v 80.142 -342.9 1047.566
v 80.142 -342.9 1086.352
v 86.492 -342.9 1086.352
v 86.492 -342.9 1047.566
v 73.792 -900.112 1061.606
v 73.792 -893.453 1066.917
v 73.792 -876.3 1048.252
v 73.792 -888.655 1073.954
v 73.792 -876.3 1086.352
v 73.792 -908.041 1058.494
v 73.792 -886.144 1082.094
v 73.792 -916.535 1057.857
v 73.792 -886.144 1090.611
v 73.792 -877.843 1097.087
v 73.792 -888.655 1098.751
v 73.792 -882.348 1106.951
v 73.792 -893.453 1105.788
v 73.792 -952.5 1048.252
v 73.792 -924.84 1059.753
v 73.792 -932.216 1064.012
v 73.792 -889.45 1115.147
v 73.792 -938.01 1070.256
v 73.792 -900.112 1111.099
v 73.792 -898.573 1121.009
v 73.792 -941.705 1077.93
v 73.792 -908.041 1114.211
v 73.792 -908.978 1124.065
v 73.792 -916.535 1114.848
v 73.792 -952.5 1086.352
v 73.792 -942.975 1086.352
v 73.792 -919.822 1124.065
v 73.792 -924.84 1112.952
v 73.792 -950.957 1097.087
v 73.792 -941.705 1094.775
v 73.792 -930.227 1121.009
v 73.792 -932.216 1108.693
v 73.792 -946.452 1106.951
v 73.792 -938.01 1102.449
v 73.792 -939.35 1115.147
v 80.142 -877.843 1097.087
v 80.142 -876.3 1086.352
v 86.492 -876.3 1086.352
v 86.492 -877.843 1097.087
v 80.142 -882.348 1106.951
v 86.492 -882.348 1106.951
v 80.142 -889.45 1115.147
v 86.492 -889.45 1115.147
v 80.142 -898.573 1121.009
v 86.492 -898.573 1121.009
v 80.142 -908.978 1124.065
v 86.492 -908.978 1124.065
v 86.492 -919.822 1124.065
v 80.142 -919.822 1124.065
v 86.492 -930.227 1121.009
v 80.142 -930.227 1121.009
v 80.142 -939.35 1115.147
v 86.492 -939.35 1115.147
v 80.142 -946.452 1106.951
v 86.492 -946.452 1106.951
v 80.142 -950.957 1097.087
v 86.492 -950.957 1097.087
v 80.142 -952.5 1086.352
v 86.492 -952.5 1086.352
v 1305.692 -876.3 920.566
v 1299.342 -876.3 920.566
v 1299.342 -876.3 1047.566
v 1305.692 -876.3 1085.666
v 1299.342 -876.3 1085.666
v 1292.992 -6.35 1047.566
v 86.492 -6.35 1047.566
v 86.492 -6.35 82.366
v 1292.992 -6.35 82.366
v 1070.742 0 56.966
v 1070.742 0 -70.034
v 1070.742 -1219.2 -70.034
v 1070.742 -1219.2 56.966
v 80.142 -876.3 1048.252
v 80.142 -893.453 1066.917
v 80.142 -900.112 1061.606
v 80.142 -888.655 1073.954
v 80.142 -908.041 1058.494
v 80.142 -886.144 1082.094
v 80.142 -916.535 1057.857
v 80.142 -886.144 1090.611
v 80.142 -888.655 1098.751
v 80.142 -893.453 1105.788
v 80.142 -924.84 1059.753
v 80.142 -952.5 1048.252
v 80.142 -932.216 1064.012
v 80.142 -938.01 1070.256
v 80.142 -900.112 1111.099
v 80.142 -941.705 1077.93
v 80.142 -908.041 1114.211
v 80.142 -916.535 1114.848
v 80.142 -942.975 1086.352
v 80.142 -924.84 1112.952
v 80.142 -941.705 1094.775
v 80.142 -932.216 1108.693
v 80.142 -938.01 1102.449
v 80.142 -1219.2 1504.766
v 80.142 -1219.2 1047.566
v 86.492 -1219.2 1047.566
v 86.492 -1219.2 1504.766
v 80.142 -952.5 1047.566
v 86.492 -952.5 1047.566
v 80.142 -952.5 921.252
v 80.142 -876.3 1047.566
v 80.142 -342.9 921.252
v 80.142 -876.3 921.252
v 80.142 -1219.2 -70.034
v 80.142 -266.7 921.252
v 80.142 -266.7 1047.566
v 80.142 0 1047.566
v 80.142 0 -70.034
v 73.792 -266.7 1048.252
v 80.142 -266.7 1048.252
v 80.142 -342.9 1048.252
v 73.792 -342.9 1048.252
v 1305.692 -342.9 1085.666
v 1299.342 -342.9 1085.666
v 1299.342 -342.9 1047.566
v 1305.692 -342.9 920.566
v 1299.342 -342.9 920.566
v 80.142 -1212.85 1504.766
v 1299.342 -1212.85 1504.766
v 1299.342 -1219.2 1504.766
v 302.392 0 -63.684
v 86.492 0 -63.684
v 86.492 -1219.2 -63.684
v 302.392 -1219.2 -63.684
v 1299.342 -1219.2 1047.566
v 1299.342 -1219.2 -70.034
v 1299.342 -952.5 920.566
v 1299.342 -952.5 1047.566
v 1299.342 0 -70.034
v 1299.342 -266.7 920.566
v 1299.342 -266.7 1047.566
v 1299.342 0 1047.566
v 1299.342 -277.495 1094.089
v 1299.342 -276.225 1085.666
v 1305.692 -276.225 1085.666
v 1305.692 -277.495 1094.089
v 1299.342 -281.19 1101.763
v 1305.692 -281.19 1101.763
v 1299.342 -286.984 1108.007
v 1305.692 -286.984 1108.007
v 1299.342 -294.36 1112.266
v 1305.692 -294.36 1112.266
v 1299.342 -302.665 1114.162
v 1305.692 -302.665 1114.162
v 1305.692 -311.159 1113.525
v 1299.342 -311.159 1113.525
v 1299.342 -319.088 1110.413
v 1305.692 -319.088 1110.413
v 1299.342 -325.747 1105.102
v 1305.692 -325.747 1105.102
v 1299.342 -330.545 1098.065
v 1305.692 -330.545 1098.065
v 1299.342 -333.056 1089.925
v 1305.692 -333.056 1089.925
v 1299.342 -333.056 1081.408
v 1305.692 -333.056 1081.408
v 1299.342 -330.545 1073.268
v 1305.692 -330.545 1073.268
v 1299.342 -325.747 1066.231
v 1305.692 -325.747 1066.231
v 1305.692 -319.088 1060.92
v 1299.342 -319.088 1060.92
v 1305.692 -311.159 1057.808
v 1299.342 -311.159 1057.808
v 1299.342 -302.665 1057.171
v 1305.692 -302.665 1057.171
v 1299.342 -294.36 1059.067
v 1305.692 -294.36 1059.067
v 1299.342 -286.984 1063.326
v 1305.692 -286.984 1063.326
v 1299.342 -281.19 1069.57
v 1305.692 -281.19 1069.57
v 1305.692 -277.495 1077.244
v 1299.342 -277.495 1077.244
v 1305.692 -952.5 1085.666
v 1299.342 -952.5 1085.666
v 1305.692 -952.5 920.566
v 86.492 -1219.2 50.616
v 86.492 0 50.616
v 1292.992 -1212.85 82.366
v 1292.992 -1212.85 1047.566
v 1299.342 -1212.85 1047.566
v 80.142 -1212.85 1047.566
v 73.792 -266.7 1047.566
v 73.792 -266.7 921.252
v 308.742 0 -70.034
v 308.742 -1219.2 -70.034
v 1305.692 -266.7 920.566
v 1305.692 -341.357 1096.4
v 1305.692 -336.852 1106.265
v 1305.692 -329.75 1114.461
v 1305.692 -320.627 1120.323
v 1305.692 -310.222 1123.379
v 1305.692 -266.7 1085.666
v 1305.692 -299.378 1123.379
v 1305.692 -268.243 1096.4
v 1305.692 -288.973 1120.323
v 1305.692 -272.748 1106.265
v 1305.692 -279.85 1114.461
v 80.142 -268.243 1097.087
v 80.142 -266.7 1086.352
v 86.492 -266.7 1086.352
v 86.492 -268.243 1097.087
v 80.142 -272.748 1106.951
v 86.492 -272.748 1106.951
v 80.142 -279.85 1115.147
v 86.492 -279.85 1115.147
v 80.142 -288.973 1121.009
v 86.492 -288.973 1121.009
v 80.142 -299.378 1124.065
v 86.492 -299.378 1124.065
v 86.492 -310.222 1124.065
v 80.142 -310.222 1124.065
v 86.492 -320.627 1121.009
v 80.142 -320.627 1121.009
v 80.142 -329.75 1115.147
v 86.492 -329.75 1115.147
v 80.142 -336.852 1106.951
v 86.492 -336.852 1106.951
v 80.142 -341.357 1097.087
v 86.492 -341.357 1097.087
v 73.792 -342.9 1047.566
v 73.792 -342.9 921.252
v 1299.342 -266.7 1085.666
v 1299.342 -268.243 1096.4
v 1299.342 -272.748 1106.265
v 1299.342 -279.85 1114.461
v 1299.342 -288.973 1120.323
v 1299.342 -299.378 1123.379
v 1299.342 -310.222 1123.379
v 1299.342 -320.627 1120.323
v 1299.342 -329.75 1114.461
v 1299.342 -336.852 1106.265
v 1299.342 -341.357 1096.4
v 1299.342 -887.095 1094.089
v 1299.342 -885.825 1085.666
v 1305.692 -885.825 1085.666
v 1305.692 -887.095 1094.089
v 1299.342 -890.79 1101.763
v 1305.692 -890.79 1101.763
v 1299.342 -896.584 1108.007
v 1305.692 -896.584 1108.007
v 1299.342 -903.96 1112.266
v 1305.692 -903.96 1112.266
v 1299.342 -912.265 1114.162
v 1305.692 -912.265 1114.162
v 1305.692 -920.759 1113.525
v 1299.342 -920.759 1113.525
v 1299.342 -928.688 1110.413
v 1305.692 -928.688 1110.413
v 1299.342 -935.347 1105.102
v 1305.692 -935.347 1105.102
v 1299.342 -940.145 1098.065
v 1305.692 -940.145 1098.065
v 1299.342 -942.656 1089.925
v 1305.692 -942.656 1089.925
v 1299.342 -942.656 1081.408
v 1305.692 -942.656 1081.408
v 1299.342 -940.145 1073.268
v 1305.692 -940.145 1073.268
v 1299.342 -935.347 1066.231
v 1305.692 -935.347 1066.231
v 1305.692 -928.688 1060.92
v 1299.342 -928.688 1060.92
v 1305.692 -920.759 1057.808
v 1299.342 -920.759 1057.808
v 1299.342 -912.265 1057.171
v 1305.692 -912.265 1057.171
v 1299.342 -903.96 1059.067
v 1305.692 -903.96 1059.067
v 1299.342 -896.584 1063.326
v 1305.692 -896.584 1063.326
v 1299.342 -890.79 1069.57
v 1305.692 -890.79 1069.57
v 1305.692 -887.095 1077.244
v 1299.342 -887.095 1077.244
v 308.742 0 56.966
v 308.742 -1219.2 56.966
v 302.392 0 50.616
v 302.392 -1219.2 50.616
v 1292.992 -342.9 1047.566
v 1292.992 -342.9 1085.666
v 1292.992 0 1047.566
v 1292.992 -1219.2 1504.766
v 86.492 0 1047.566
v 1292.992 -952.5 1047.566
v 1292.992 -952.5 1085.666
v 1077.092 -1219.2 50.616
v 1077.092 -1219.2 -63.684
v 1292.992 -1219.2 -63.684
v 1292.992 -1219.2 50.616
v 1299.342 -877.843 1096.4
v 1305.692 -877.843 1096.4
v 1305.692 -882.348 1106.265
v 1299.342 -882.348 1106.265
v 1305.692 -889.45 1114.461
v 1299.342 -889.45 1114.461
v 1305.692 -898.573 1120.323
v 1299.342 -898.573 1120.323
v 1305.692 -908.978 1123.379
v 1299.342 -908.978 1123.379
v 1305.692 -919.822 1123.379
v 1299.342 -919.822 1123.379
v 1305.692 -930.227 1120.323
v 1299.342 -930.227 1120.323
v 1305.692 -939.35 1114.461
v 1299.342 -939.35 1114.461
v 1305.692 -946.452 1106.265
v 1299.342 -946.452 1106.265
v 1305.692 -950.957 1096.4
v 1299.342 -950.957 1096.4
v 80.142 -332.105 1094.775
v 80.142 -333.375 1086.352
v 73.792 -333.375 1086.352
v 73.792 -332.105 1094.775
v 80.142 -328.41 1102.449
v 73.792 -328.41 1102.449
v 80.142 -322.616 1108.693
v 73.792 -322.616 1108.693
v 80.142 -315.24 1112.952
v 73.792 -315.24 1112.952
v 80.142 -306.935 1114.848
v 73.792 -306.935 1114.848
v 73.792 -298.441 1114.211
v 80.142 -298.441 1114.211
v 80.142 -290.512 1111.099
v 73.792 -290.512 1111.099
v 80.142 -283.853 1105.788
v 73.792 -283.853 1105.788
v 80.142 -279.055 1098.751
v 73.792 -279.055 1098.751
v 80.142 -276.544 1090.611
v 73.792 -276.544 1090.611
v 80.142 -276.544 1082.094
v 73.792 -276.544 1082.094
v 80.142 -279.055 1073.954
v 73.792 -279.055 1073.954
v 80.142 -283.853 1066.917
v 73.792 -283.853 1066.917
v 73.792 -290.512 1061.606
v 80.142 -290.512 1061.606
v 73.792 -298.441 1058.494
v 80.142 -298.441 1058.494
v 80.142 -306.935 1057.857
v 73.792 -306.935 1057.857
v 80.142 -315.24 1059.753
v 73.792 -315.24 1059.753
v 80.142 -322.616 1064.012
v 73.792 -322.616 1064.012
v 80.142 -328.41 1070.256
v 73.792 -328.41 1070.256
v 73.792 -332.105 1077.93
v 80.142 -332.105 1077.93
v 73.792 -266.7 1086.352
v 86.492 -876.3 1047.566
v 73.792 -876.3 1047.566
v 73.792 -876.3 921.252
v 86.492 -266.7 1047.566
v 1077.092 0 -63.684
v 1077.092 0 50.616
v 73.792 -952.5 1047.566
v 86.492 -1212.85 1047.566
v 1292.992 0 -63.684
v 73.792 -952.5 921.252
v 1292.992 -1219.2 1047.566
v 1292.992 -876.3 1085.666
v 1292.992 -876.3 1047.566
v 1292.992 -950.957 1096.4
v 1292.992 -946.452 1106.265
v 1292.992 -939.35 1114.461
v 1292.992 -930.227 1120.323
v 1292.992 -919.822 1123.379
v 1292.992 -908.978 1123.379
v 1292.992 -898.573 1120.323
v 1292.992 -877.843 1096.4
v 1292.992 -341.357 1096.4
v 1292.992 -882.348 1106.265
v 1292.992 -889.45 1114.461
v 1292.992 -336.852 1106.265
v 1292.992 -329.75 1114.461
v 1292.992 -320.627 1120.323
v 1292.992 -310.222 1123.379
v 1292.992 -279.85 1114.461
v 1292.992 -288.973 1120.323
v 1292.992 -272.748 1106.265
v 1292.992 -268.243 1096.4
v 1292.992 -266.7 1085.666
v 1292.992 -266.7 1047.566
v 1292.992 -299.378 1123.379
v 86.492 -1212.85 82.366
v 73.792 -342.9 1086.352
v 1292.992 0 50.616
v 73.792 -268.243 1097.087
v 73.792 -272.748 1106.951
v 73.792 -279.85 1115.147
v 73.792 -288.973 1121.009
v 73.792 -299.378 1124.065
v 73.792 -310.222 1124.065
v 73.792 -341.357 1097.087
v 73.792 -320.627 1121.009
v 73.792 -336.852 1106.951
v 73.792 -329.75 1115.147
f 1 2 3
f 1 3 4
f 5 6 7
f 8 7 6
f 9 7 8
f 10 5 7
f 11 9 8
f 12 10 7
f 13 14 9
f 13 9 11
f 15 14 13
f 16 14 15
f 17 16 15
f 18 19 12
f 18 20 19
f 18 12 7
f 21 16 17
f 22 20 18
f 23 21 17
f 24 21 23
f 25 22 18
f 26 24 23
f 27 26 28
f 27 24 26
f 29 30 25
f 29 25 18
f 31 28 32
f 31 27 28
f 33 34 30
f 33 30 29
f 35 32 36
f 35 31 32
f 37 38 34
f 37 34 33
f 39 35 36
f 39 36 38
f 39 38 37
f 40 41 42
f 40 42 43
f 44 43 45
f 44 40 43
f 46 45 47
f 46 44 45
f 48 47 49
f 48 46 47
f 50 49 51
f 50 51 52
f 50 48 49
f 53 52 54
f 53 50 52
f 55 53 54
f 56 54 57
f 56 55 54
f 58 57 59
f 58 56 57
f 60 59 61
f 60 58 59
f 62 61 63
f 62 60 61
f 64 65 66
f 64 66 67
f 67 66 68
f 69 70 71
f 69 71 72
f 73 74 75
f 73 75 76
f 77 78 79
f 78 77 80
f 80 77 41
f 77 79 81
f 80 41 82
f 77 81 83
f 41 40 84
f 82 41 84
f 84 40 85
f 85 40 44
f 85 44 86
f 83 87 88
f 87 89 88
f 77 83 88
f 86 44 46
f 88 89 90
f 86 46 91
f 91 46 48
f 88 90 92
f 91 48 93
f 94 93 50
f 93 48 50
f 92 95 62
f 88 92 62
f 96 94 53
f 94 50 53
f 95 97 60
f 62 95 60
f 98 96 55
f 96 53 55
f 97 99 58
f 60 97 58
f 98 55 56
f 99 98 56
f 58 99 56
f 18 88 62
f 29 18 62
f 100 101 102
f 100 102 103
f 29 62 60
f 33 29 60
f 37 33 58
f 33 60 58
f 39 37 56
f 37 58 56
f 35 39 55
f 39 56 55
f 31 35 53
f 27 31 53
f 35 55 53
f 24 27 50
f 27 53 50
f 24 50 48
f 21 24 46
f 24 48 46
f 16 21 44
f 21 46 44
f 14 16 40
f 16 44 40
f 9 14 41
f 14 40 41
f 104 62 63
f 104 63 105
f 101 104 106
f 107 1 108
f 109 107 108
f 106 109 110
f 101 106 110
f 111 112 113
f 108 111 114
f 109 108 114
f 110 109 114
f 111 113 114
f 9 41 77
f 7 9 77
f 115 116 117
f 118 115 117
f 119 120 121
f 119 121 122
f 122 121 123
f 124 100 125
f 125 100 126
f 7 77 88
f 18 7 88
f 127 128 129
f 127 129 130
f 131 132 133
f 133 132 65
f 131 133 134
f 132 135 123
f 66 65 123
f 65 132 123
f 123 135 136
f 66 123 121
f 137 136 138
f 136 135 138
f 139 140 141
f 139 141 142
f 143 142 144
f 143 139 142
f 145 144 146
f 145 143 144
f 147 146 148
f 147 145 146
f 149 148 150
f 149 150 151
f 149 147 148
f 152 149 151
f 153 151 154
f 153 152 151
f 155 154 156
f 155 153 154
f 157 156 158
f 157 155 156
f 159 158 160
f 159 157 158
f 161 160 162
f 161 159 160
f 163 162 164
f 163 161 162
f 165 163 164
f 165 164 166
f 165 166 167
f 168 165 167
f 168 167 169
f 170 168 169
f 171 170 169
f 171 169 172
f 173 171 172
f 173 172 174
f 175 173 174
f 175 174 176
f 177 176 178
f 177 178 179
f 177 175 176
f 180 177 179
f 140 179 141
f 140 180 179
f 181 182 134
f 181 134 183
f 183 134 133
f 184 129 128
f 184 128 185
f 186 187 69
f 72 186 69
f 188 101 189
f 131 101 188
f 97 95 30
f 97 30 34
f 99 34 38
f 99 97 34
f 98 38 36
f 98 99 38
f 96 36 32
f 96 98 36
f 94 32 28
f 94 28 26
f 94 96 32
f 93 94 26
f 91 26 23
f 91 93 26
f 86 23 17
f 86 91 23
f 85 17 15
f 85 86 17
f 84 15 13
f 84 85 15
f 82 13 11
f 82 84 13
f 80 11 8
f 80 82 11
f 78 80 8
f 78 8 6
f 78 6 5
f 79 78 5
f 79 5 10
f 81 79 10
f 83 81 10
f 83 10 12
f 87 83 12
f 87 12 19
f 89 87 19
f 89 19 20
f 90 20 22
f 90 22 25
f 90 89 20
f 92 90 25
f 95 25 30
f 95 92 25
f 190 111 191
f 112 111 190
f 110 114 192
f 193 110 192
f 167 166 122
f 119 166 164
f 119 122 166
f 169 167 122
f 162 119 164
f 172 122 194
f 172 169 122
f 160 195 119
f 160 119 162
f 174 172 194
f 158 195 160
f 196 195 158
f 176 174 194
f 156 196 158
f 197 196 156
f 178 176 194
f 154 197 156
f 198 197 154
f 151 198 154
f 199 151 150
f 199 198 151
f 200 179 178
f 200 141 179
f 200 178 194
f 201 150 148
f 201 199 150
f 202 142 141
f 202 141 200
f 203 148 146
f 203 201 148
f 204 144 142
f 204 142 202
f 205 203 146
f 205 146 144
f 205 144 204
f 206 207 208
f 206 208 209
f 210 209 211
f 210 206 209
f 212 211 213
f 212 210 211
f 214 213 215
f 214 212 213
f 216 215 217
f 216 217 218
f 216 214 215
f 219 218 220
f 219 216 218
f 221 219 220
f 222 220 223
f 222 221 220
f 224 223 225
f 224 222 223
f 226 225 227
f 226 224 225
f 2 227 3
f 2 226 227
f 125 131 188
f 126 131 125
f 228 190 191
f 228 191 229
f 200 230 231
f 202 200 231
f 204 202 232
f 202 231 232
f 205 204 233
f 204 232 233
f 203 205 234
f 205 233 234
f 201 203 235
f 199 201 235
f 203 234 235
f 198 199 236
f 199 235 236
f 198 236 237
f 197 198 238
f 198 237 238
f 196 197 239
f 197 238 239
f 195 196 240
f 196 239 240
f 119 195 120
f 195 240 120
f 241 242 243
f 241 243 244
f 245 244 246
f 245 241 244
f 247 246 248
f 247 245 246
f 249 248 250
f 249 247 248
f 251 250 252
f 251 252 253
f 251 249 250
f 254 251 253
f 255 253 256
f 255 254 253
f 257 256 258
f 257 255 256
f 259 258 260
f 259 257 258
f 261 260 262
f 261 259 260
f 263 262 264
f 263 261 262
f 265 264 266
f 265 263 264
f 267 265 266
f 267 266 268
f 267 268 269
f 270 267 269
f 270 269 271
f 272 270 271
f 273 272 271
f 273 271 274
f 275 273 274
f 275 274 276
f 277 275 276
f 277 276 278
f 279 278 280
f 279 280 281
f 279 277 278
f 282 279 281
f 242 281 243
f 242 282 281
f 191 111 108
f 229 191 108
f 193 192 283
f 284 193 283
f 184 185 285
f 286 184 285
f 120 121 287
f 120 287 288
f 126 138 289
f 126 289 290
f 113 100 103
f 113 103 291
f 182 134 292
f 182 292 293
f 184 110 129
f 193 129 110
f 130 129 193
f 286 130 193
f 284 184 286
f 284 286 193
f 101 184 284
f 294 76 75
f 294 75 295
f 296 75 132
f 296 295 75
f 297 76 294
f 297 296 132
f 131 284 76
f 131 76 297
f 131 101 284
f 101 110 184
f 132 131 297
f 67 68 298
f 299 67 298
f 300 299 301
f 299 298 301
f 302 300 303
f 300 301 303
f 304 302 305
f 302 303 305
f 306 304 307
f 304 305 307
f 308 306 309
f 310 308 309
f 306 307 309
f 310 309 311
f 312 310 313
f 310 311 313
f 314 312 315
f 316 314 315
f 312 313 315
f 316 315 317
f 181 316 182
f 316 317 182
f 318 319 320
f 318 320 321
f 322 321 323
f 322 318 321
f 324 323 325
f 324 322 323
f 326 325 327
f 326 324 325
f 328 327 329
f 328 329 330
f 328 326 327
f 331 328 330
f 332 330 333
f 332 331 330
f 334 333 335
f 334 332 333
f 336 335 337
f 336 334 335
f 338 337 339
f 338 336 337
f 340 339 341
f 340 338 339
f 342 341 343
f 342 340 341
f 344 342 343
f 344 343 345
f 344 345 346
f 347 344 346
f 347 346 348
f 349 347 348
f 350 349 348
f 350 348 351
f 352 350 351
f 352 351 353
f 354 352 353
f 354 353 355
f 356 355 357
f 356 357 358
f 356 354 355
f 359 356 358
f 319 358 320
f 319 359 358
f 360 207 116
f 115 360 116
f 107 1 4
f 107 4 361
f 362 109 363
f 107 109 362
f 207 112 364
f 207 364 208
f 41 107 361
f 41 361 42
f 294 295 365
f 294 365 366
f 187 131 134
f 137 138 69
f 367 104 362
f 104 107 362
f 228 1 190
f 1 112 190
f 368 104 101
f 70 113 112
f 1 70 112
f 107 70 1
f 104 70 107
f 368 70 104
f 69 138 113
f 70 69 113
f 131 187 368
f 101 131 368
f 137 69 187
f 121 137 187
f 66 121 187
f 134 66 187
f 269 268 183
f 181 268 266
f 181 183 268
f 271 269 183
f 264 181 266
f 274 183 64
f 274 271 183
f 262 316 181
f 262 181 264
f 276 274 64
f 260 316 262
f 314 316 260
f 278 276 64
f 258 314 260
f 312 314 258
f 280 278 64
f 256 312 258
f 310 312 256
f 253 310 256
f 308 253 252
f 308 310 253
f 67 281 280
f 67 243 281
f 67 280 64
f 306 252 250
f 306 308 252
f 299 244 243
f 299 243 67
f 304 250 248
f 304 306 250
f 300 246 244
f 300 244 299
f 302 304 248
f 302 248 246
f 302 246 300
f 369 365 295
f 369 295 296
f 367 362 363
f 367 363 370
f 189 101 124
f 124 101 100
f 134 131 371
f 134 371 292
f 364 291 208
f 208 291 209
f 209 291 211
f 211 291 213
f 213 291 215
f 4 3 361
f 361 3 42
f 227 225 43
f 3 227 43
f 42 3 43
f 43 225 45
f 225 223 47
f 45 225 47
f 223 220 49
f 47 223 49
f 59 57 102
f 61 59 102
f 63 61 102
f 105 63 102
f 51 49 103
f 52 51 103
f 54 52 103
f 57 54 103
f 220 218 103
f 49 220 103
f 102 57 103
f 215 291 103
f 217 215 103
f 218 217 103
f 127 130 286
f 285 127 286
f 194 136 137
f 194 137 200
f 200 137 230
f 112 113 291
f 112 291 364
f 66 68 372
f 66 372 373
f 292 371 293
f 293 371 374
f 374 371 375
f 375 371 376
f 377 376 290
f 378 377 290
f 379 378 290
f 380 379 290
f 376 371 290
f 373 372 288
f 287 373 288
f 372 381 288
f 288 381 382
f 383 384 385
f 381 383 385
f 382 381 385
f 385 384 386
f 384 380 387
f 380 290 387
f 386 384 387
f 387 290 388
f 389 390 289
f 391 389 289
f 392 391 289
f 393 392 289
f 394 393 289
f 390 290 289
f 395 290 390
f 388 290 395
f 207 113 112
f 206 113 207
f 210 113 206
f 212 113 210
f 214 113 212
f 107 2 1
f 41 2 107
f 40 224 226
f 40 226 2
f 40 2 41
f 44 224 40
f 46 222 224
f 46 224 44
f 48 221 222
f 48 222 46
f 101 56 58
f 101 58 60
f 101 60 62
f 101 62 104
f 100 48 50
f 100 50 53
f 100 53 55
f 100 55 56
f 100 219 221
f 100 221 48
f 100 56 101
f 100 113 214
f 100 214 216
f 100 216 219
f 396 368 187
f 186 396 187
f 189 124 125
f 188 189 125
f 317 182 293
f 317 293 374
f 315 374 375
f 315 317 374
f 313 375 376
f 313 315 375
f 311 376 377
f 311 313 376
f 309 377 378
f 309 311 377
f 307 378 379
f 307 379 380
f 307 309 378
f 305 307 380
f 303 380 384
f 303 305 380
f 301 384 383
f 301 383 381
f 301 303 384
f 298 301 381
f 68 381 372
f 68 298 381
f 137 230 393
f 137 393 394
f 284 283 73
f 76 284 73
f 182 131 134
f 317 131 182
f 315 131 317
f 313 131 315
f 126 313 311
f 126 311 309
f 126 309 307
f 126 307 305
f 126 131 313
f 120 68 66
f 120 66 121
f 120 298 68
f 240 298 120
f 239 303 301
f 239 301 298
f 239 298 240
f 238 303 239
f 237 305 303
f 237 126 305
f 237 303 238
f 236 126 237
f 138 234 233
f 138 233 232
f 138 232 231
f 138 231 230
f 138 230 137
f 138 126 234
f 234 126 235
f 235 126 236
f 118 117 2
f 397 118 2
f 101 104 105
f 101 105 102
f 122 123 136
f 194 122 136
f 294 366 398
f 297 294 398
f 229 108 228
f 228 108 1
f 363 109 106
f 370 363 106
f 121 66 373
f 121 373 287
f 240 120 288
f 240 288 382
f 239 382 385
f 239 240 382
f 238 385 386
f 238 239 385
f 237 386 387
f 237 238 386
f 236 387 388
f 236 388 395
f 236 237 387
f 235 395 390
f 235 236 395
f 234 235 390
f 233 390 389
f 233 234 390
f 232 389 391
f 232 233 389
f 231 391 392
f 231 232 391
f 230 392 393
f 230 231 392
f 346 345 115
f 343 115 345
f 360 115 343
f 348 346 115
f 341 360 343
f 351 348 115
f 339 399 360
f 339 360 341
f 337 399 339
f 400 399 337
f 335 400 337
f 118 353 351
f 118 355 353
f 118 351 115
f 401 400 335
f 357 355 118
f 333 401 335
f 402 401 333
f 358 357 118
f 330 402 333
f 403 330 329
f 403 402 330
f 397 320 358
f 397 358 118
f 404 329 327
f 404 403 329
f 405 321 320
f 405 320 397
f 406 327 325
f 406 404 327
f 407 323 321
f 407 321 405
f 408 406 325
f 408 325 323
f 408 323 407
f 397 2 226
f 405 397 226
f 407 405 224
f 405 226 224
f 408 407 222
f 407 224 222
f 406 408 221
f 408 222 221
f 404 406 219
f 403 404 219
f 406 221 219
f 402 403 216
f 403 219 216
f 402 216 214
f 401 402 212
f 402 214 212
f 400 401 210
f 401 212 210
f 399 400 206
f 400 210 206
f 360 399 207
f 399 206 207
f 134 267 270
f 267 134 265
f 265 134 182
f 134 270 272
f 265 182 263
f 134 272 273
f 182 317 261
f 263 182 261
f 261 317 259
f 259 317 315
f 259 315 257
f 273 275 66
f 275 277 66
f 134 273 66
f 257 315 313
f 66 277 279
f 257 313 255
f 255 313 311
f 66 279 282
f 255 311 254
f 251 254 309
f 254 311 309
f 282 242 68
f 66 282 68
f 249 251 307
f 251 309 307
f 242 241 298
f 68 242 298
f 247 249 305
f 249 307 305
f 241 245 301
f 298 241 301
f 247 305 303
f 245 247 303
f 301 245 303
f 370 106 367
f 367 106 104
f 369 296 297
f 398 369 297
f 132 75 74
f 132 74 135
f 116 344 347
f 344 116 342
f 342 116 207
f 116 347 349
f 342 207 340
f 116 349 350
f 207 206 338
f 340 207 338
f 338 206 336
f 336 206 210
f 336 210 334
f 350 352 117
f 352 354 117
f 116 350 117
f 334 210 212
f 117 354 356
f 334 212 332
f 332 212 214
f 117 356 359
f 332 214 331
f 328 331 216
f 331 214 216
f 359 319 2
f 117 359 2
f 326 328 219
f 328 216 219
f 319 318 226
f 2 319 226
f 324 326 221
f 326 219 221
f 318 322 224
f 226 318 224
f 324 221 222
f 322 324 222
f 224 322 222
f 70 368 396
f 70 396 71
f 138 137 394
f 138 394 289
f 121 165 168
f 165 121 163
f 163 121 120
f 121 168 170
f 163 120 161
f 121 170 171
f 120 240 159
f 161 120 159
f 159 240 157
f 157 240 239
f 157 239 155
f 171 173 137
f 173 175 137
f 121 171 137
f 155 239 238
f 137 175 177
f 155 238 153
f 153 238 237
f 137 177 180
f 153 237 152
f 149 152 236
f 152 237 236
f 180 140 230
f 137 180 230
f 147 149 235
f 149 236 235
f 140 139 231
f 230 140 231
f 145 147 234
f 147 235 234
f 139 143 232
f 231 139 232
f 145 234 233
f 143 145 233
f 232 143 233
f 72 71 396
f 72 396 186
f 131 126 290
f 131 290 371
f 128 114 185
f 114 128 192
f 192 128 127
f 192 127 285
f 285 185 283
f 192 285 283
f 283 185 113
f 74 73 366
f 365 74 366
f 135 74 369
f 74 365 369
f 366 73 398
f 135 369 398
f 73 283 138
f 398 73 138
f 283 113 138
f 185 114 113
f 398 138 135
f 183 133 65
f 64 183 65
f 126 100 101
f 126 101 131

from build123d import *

# Parameters (mm, degrees)
F0_W      = 228.6
F0_H      = 127
F0_W_2    = 215.9
F0_H_2    = 114.3
F1_DEPTH  = 1219.2
F2_W      = 1206.5
F2_H      = 1206.5
F3_DEPTH  = 965.2
F4_DEPTH  = 1219.2
F5_R      = 28.575
F7_DEPTH  = 6.35
F5_W      = 76.2
F5_H      = 126.3139492095
F6_W      = 76.2
F6_H      = 127
F6_R      = 28.575
F8_DEPTH  = 6.35
F9_DEPTH  = 6.35
F10_DEPTH = 6.35
F11_W     = 1219.2
F11_H     = 457.2
F12_DEPTH = 6.35


with BuildPart() as f1:
    # F0 (on Front) → F1 (new body)
    with BuildSketch(Plane.XZ):
        Polygon((1299.3415698051, 1047.566442287), (80.1415698051, 1047.566442287), (80.1415698051, 56.966442287), (308.7415698051, 56.966442287), (1070.7415698051, 56.966442287), (1299.3415698051, 56.966442287), align=None)
        with Locations((194.4415698051, -6.533557713)):
            Rectangle(F0_W, F0_H)
        with Locations((194.4415698051, -6.533557713)):
            Rectangle(F0_W_2, F0_H_2, mode=Mode.SUBTRACT)
        with Locations((1185.0415698051, -6.533557713)):
            Rectangle(F0_W, F0_H)
        with Locations((1185.0415698051, -6.533557713)):
            Rectangle(F0_W_2, F0_H_2, mode=Mode.SUBTRACT)
    extrude(amount=F1_DEPTH)

    # F2 (on face) → F3 (cut)
    with BuildSketch(Plane.XY.offset(1047.566442287)):
        with Locations((689.7415698051, -609.6)):
            Rectangle(F2_W, F2_H)
    extrude(amount=-F3_DEPTH, mode=Mode.SUBTRACT)

    # F0 (on Front) → F4 (cut)
    with BuildSketch(Plane.XZ):
        with Locations((1185.0415698051, -6.533557713)):
            Rectangle(F0_W_2, F0_H_2)
        with Locations((194.4415698051, -6.533557713)):
            Rectangle(F0_W_2, F0_H_2)
    extrude(amount=F4_DEPTH, mode=Mode.SUBTRACT)

    # F5 (on face) → F7, piece 2 (join)
    with BuildSketch(Plane(origin=(80.1415698051, 0, 0), x_dir=(0, -1, 0), z_dir=(-1, 0, 0))):
        with Locations((304.8, 984.4094676822)):
            Rectangle(F5_W, F5_H)
        with Locations((914.4, 984.4094676822)):
            Rectangle(F5_W, F5_H)
    extrude(amount=F7_DEPTH)

    # F6 (on face) → F8 (join)
    with BuildSketch(Plane.YZ.offset(1299.3415698051)):
        with Locations((-914.4, 984.066442287)):
            Rectangle(F6_W, F6_H)
        with BuildLine():
            Line((-952.5, 1047.566442287), (-876.3, 1047.566442287))
            Line((-876.3, 1047.566442287), (-876.3, 1085.666442287))
            ThreePointArc((-876.3, 1085.666442287), (-914.4, 1123.766442287), (-952.5, 1085.666442287))
            Line((-952.5, 1085.666442287), (-952.5, 1047.566442287))
        make_face()
        with Locations((-914.4, 1085.666442287)):
            Circle(F6_R, mode=Mode.SUBTRACT)
        with Locations((-304.8, 984.066442287)):
            Rectangle(F6_W, F6_H)
        with BuildLine():
            Line((-342.9, 1085.666442287), (-342.9, 1047.566442287))
            Line((-342.9, 1047.566442287), (-266.7, 1047.566442287))
            Line((-266.7, 1047.566442287), (-266.7, 1085.666442287))
            ThreePointArc((-266.7, 1085.666442287), (-304.8, 1123.766442287), (-342.9, 1085.666442287))
        make_face()
        with Locations((-304.8, 1085.666442287)):
            Circle(F6_R, mode=Mode.SUBTRACT)
    extrude(amount=F8_DEPTH)


with BuildPart() as f7:
    # F5 (on face) → F7 (new body)
    with BuildSketch(Plane(origin=(80.1415698051, 0, 0), x_dir=(0, -1, 0), z_dir=(-1, 0, 0))):
        with BuildLine():
            Line((266.7, 1048.2524930775), (342.9, 1048.2524930775))
            Line((342.9, 1048.2524930775), (342.9, 1086.3524930775))
            ThreePointArc((342.9, 1086.3524930775), (304.8, 1124.4524930775), (266.7, 1086.3524930775))
            Line((266.7, 1086.3524930775), (266.7, 1048.2524930775))
        make_face()
        with Locations((304.8, 1086.3524930775)):
            Circle(F5_R, mode=Mode.SUBTRACT)
    extrude(amount=F7_DEPTH)


with BuildPart() as f7b:
    # F5 (on face) → F7, piece 3 (new body)
    with BuildSketch(Plane(origin=(80.1415698051, 0, 0), x_dir=(0, -1, 0), z_dir=(-1, 0, 0))):
        with BuildLine():
            Line((876.3, 1086.3524930775), (876.3, 1048.2524930775))
            Line((876.3, 1048.2524930775), (952.5, 1048.2524930775))
            Line((952.5, 1048.2524930775), (952.5, 1086.3524930775))
            ThreePointArc((952.5, 1086.3524930775), (914.4, 1124.4524930775), (876.3, 1086.3524930775))
        make_face()
        with Locations((914.4, 1086.3524930775)):
            Circle(F5_R, mode=Mode.SUBTRACT)
    extrude(amount=F7_DEPTH)


with BuildPart() as f9:
    # F5 (on face) → F9 (new body)
    with BuildSketch(Plane(origin=(80.1415698051, 0, 0), x_dir=(0, -1, 0), z_dir=(-1, 0, 0))):
        with BuildLine():
            Line((342.9, 1048.2524930775), (342.9, 1047.566442287))
            Line((342.9, 1047.566442287), (876.3, 1047.566442287))
            Line((876.3, 1047.566442287), (876.3, 1048.2524930775))
            Line((876.3, 1048.2524930775), (876.3, 1086.3524930775))
            ThreePointArc((876.3, 1086.3524930775), (914.4, 1124.4524930775), (952.5, 1086.3524930775))
            Line((952.5, 1086.3524930775), (952.5, 1048.2524930775))
            Line((952.5, 1048.2524930775), (952.5, 1047.566442287))
            Line((952.5, 1047.566442287), (1219.2, 1047.566442287))
            Line((1219.2, 1047.566442287), (1219.2, 1504.766442287))
            Line((1219.2, 1504.766442287), (0, 1047.566442287))
            Line((0, 1047.566442287), (266.7, 1047.566442287))
            Line((266.7, 1047.566442287), (266.7, 1048.2524930775))
            Line((266.7, 1048.2524930775), (266.7, 1086.3524930775))
            ThreePointArc((266.7, 1086.3524930775), (304.8, 1124.4524930775), (342.9, 1086.3524930775))
            Line((342.9, 1086.3524930775), (342.9, 1048.2524930775))
        make_face()
    extrude(amount=-F9_DEPTH)


with BuildPart() as f10:
    # F6 (on face) → F10 (new body)
    with BuildSketch(Plane.YZ.offset(1299.3415698051)):
        with BuildLine():
            Line((-876.3, 1085.666442287), (-876.3, 1047.566442287))
            Line((-876.3, 1047.566442287), (-342.9, 1047.566442287))
            Line((-342.9, 1047.566442287), (-342.9, 1085.666442287))
            ThreePointArc((-342.9, 1085.666442287), (-304.8, 1123.766442287), (-266.7, 1085.666442287))
            Line((-266.7, 1085.666442287), (-266.7, 1047.566442287))
            Line((-266.7, 1047.566442287), (0, 1047.566442287))
            Line((0, 1047.566442287), (-1219.2, 1504.766442287))
            Line((-1219.2, 1504.766442287), (-1219.2, 1047.566442287))
            Line((-1219.2, 1047.566442287), (-952.5, 1047.566442287))
            Line((-952.5, 1047.566442287), (-952.5, 1085.666442287))
            ThreePointArc((-952.5, 1085.666442287), (-914.4, 1123.766442287), (-876.3, 1085.666442287))
        make_face()
    extrude(amount=-F10_DEPTH)


with BuildPart() as f12:
    # F11 (on face) → F12 (new body)
    with BuildSketch(Plane.XZ.offset(1219.2)):
        with Locations((689.7415698051, 1276.166442287)):
            Rectangle(F11_W, F11_H)
    extrude(amount=-F12_DEPTH)


solid = Compound([f1.part, f7.part, f7b.part, f9.part, f10.part, f12.part])
